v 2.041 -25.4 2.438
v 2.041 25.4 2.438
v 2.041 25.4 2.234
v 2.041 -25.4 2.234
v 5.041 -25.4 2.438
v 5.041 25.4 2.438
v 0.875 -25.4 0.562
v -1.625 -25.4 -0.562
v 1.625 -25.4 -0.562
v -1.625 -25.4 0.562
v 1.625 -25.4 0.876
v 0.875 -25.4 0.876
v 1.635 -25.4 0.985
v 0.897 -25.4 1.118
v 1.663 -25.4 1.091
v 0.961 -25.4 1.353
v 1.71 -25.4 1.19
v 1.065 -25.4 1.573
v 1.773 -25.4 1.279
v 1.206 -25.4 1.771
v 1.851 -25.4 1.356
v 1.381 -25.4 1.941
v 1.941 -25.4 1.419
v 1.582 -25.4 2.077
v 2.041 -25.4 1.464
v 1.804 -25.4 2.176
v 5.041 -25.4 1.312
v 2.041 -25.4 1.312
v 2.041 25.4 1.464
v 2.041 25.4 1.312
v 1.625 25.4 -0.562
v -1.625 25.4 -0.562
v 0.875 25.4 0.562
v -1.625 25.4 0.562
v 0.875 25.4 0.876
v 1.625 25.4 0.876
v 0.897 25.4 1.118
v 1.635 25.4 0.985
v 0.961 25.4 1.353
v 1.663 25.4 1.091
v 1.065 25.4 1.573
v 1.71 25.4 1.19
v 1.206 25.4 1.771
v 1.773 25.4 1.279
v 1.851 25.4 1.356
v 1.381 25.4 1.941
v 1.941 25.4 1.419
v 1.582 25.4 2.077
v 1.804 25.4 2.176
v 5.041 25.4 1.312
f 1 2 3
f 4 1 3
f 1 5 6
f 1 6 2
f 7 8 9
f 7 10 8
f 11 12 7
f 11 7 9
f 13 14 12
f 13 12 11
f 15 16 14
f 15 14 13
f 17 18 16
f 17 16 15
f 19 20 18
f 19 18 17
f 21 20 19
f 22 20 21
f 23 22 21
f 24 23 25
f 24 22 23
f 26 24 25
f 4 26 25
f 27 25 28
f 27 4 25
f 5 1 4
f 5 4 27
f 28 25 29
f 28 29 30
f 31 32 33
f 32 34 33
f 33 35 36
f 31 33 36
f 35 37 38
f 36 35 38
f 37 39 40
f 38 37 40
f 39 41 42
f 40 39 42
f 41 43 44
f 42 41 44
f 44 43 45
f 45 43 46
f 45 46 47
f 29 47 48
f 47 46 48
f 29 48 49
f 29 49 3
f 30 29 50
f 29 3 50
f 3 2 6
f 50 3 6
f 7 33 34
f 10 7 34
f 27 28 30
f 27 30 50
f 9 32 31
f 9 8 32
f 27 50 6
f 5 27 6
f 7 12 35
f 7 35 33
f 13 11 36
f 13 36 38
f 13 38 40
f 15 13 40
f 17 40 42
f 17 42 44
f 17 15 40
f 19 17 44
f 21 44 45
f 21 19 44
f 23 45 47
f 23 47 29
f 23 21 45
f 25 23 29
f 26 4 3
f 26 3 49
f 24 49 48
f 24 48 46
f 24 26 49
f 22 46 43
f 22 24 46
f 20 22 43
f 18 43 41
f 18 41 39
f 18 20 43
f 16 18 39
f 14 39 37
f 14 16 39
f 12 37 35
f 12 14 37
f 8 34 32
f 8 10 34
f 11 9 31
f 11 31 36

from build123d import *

# Parameters (mm, degrees)
F1_DEPTH = 25.4


with BuildPart() as f1:
    # F0 (on Front) → F1 (new body, symmetric)
    with BuildSketch(Plane.XZ):
        Polygon((-1.625, -0.5625), (1.625, -0.5625), (1.625, 0.5625), (0.875, 0.5625), (-1.625, 0.5625), align=None)
        with BuildLine():
            Line((0.875, 0.5625), (1.625, 0.5625))
            Line((1.625, 0.5625), (1.625, 0.8755))
            ThreePointArc((1.625, 0.8755), (1.739421, 1.235964), (2.04079, 1.464445))
            Line((2.04079, 1.464445), (2.04079, 2.234491))
            ThreePointArc((2.04079, 2.234491), (1.206379, 1.770755), (0.875, 0.8755))
            Line((0.875, 0.8755), (0.875, 0.5625))
        make_face()
        with BuildLine():
            ThreePointArc((2.25, 2.2505), (2.145089, 2.246492), (2.04079, 2.234491))
            Line((2.04079, 2.234491), (2.04079, 1.464445))
            ThreePointArc((2.04079, 1.464445), (2.143853, 1.49142), (2.25, 1.5005))
            Line((2.25, 1.5005), (3.375, 1.5005))
            Line((3.375, 1.5005), (3.375, 2.2505))
            Line((3.375, 2.2505), (2.25, 2.2505))
        make_face()
        with BuildLine():
            Line((2.04079, 2.4375), (2.04079, 2.234491))
            ThreePointArc((2.04079, 2.234491), (2.145089, 2.246492), (2.25, 2.2505))
            Line((2.25, 2.2505), (3.375, 2.2505))
            Line((3.375, 2.2505), (3.375, 1.5005))
            Line((3.375, 1.5005), (2.25, 1.5005))
            ThreePointArc((2.25, 1.5005), (2.143853, 1.49142), (2.04079, 1.464445))
            Line((2.04079, 1.464445), (2.04079, 1.3125))
            Line((2.04079, 1.3125), (5.04079, 1.3125))
            Line((5.04079, 1.3125), (5.04079, 2.4375))
            Line((5.04079, 2.4375), (2.04079, 2.4375))
        make_face()
    extrude(amount=F1_DEPTH, both=True)


solid = f1.part
